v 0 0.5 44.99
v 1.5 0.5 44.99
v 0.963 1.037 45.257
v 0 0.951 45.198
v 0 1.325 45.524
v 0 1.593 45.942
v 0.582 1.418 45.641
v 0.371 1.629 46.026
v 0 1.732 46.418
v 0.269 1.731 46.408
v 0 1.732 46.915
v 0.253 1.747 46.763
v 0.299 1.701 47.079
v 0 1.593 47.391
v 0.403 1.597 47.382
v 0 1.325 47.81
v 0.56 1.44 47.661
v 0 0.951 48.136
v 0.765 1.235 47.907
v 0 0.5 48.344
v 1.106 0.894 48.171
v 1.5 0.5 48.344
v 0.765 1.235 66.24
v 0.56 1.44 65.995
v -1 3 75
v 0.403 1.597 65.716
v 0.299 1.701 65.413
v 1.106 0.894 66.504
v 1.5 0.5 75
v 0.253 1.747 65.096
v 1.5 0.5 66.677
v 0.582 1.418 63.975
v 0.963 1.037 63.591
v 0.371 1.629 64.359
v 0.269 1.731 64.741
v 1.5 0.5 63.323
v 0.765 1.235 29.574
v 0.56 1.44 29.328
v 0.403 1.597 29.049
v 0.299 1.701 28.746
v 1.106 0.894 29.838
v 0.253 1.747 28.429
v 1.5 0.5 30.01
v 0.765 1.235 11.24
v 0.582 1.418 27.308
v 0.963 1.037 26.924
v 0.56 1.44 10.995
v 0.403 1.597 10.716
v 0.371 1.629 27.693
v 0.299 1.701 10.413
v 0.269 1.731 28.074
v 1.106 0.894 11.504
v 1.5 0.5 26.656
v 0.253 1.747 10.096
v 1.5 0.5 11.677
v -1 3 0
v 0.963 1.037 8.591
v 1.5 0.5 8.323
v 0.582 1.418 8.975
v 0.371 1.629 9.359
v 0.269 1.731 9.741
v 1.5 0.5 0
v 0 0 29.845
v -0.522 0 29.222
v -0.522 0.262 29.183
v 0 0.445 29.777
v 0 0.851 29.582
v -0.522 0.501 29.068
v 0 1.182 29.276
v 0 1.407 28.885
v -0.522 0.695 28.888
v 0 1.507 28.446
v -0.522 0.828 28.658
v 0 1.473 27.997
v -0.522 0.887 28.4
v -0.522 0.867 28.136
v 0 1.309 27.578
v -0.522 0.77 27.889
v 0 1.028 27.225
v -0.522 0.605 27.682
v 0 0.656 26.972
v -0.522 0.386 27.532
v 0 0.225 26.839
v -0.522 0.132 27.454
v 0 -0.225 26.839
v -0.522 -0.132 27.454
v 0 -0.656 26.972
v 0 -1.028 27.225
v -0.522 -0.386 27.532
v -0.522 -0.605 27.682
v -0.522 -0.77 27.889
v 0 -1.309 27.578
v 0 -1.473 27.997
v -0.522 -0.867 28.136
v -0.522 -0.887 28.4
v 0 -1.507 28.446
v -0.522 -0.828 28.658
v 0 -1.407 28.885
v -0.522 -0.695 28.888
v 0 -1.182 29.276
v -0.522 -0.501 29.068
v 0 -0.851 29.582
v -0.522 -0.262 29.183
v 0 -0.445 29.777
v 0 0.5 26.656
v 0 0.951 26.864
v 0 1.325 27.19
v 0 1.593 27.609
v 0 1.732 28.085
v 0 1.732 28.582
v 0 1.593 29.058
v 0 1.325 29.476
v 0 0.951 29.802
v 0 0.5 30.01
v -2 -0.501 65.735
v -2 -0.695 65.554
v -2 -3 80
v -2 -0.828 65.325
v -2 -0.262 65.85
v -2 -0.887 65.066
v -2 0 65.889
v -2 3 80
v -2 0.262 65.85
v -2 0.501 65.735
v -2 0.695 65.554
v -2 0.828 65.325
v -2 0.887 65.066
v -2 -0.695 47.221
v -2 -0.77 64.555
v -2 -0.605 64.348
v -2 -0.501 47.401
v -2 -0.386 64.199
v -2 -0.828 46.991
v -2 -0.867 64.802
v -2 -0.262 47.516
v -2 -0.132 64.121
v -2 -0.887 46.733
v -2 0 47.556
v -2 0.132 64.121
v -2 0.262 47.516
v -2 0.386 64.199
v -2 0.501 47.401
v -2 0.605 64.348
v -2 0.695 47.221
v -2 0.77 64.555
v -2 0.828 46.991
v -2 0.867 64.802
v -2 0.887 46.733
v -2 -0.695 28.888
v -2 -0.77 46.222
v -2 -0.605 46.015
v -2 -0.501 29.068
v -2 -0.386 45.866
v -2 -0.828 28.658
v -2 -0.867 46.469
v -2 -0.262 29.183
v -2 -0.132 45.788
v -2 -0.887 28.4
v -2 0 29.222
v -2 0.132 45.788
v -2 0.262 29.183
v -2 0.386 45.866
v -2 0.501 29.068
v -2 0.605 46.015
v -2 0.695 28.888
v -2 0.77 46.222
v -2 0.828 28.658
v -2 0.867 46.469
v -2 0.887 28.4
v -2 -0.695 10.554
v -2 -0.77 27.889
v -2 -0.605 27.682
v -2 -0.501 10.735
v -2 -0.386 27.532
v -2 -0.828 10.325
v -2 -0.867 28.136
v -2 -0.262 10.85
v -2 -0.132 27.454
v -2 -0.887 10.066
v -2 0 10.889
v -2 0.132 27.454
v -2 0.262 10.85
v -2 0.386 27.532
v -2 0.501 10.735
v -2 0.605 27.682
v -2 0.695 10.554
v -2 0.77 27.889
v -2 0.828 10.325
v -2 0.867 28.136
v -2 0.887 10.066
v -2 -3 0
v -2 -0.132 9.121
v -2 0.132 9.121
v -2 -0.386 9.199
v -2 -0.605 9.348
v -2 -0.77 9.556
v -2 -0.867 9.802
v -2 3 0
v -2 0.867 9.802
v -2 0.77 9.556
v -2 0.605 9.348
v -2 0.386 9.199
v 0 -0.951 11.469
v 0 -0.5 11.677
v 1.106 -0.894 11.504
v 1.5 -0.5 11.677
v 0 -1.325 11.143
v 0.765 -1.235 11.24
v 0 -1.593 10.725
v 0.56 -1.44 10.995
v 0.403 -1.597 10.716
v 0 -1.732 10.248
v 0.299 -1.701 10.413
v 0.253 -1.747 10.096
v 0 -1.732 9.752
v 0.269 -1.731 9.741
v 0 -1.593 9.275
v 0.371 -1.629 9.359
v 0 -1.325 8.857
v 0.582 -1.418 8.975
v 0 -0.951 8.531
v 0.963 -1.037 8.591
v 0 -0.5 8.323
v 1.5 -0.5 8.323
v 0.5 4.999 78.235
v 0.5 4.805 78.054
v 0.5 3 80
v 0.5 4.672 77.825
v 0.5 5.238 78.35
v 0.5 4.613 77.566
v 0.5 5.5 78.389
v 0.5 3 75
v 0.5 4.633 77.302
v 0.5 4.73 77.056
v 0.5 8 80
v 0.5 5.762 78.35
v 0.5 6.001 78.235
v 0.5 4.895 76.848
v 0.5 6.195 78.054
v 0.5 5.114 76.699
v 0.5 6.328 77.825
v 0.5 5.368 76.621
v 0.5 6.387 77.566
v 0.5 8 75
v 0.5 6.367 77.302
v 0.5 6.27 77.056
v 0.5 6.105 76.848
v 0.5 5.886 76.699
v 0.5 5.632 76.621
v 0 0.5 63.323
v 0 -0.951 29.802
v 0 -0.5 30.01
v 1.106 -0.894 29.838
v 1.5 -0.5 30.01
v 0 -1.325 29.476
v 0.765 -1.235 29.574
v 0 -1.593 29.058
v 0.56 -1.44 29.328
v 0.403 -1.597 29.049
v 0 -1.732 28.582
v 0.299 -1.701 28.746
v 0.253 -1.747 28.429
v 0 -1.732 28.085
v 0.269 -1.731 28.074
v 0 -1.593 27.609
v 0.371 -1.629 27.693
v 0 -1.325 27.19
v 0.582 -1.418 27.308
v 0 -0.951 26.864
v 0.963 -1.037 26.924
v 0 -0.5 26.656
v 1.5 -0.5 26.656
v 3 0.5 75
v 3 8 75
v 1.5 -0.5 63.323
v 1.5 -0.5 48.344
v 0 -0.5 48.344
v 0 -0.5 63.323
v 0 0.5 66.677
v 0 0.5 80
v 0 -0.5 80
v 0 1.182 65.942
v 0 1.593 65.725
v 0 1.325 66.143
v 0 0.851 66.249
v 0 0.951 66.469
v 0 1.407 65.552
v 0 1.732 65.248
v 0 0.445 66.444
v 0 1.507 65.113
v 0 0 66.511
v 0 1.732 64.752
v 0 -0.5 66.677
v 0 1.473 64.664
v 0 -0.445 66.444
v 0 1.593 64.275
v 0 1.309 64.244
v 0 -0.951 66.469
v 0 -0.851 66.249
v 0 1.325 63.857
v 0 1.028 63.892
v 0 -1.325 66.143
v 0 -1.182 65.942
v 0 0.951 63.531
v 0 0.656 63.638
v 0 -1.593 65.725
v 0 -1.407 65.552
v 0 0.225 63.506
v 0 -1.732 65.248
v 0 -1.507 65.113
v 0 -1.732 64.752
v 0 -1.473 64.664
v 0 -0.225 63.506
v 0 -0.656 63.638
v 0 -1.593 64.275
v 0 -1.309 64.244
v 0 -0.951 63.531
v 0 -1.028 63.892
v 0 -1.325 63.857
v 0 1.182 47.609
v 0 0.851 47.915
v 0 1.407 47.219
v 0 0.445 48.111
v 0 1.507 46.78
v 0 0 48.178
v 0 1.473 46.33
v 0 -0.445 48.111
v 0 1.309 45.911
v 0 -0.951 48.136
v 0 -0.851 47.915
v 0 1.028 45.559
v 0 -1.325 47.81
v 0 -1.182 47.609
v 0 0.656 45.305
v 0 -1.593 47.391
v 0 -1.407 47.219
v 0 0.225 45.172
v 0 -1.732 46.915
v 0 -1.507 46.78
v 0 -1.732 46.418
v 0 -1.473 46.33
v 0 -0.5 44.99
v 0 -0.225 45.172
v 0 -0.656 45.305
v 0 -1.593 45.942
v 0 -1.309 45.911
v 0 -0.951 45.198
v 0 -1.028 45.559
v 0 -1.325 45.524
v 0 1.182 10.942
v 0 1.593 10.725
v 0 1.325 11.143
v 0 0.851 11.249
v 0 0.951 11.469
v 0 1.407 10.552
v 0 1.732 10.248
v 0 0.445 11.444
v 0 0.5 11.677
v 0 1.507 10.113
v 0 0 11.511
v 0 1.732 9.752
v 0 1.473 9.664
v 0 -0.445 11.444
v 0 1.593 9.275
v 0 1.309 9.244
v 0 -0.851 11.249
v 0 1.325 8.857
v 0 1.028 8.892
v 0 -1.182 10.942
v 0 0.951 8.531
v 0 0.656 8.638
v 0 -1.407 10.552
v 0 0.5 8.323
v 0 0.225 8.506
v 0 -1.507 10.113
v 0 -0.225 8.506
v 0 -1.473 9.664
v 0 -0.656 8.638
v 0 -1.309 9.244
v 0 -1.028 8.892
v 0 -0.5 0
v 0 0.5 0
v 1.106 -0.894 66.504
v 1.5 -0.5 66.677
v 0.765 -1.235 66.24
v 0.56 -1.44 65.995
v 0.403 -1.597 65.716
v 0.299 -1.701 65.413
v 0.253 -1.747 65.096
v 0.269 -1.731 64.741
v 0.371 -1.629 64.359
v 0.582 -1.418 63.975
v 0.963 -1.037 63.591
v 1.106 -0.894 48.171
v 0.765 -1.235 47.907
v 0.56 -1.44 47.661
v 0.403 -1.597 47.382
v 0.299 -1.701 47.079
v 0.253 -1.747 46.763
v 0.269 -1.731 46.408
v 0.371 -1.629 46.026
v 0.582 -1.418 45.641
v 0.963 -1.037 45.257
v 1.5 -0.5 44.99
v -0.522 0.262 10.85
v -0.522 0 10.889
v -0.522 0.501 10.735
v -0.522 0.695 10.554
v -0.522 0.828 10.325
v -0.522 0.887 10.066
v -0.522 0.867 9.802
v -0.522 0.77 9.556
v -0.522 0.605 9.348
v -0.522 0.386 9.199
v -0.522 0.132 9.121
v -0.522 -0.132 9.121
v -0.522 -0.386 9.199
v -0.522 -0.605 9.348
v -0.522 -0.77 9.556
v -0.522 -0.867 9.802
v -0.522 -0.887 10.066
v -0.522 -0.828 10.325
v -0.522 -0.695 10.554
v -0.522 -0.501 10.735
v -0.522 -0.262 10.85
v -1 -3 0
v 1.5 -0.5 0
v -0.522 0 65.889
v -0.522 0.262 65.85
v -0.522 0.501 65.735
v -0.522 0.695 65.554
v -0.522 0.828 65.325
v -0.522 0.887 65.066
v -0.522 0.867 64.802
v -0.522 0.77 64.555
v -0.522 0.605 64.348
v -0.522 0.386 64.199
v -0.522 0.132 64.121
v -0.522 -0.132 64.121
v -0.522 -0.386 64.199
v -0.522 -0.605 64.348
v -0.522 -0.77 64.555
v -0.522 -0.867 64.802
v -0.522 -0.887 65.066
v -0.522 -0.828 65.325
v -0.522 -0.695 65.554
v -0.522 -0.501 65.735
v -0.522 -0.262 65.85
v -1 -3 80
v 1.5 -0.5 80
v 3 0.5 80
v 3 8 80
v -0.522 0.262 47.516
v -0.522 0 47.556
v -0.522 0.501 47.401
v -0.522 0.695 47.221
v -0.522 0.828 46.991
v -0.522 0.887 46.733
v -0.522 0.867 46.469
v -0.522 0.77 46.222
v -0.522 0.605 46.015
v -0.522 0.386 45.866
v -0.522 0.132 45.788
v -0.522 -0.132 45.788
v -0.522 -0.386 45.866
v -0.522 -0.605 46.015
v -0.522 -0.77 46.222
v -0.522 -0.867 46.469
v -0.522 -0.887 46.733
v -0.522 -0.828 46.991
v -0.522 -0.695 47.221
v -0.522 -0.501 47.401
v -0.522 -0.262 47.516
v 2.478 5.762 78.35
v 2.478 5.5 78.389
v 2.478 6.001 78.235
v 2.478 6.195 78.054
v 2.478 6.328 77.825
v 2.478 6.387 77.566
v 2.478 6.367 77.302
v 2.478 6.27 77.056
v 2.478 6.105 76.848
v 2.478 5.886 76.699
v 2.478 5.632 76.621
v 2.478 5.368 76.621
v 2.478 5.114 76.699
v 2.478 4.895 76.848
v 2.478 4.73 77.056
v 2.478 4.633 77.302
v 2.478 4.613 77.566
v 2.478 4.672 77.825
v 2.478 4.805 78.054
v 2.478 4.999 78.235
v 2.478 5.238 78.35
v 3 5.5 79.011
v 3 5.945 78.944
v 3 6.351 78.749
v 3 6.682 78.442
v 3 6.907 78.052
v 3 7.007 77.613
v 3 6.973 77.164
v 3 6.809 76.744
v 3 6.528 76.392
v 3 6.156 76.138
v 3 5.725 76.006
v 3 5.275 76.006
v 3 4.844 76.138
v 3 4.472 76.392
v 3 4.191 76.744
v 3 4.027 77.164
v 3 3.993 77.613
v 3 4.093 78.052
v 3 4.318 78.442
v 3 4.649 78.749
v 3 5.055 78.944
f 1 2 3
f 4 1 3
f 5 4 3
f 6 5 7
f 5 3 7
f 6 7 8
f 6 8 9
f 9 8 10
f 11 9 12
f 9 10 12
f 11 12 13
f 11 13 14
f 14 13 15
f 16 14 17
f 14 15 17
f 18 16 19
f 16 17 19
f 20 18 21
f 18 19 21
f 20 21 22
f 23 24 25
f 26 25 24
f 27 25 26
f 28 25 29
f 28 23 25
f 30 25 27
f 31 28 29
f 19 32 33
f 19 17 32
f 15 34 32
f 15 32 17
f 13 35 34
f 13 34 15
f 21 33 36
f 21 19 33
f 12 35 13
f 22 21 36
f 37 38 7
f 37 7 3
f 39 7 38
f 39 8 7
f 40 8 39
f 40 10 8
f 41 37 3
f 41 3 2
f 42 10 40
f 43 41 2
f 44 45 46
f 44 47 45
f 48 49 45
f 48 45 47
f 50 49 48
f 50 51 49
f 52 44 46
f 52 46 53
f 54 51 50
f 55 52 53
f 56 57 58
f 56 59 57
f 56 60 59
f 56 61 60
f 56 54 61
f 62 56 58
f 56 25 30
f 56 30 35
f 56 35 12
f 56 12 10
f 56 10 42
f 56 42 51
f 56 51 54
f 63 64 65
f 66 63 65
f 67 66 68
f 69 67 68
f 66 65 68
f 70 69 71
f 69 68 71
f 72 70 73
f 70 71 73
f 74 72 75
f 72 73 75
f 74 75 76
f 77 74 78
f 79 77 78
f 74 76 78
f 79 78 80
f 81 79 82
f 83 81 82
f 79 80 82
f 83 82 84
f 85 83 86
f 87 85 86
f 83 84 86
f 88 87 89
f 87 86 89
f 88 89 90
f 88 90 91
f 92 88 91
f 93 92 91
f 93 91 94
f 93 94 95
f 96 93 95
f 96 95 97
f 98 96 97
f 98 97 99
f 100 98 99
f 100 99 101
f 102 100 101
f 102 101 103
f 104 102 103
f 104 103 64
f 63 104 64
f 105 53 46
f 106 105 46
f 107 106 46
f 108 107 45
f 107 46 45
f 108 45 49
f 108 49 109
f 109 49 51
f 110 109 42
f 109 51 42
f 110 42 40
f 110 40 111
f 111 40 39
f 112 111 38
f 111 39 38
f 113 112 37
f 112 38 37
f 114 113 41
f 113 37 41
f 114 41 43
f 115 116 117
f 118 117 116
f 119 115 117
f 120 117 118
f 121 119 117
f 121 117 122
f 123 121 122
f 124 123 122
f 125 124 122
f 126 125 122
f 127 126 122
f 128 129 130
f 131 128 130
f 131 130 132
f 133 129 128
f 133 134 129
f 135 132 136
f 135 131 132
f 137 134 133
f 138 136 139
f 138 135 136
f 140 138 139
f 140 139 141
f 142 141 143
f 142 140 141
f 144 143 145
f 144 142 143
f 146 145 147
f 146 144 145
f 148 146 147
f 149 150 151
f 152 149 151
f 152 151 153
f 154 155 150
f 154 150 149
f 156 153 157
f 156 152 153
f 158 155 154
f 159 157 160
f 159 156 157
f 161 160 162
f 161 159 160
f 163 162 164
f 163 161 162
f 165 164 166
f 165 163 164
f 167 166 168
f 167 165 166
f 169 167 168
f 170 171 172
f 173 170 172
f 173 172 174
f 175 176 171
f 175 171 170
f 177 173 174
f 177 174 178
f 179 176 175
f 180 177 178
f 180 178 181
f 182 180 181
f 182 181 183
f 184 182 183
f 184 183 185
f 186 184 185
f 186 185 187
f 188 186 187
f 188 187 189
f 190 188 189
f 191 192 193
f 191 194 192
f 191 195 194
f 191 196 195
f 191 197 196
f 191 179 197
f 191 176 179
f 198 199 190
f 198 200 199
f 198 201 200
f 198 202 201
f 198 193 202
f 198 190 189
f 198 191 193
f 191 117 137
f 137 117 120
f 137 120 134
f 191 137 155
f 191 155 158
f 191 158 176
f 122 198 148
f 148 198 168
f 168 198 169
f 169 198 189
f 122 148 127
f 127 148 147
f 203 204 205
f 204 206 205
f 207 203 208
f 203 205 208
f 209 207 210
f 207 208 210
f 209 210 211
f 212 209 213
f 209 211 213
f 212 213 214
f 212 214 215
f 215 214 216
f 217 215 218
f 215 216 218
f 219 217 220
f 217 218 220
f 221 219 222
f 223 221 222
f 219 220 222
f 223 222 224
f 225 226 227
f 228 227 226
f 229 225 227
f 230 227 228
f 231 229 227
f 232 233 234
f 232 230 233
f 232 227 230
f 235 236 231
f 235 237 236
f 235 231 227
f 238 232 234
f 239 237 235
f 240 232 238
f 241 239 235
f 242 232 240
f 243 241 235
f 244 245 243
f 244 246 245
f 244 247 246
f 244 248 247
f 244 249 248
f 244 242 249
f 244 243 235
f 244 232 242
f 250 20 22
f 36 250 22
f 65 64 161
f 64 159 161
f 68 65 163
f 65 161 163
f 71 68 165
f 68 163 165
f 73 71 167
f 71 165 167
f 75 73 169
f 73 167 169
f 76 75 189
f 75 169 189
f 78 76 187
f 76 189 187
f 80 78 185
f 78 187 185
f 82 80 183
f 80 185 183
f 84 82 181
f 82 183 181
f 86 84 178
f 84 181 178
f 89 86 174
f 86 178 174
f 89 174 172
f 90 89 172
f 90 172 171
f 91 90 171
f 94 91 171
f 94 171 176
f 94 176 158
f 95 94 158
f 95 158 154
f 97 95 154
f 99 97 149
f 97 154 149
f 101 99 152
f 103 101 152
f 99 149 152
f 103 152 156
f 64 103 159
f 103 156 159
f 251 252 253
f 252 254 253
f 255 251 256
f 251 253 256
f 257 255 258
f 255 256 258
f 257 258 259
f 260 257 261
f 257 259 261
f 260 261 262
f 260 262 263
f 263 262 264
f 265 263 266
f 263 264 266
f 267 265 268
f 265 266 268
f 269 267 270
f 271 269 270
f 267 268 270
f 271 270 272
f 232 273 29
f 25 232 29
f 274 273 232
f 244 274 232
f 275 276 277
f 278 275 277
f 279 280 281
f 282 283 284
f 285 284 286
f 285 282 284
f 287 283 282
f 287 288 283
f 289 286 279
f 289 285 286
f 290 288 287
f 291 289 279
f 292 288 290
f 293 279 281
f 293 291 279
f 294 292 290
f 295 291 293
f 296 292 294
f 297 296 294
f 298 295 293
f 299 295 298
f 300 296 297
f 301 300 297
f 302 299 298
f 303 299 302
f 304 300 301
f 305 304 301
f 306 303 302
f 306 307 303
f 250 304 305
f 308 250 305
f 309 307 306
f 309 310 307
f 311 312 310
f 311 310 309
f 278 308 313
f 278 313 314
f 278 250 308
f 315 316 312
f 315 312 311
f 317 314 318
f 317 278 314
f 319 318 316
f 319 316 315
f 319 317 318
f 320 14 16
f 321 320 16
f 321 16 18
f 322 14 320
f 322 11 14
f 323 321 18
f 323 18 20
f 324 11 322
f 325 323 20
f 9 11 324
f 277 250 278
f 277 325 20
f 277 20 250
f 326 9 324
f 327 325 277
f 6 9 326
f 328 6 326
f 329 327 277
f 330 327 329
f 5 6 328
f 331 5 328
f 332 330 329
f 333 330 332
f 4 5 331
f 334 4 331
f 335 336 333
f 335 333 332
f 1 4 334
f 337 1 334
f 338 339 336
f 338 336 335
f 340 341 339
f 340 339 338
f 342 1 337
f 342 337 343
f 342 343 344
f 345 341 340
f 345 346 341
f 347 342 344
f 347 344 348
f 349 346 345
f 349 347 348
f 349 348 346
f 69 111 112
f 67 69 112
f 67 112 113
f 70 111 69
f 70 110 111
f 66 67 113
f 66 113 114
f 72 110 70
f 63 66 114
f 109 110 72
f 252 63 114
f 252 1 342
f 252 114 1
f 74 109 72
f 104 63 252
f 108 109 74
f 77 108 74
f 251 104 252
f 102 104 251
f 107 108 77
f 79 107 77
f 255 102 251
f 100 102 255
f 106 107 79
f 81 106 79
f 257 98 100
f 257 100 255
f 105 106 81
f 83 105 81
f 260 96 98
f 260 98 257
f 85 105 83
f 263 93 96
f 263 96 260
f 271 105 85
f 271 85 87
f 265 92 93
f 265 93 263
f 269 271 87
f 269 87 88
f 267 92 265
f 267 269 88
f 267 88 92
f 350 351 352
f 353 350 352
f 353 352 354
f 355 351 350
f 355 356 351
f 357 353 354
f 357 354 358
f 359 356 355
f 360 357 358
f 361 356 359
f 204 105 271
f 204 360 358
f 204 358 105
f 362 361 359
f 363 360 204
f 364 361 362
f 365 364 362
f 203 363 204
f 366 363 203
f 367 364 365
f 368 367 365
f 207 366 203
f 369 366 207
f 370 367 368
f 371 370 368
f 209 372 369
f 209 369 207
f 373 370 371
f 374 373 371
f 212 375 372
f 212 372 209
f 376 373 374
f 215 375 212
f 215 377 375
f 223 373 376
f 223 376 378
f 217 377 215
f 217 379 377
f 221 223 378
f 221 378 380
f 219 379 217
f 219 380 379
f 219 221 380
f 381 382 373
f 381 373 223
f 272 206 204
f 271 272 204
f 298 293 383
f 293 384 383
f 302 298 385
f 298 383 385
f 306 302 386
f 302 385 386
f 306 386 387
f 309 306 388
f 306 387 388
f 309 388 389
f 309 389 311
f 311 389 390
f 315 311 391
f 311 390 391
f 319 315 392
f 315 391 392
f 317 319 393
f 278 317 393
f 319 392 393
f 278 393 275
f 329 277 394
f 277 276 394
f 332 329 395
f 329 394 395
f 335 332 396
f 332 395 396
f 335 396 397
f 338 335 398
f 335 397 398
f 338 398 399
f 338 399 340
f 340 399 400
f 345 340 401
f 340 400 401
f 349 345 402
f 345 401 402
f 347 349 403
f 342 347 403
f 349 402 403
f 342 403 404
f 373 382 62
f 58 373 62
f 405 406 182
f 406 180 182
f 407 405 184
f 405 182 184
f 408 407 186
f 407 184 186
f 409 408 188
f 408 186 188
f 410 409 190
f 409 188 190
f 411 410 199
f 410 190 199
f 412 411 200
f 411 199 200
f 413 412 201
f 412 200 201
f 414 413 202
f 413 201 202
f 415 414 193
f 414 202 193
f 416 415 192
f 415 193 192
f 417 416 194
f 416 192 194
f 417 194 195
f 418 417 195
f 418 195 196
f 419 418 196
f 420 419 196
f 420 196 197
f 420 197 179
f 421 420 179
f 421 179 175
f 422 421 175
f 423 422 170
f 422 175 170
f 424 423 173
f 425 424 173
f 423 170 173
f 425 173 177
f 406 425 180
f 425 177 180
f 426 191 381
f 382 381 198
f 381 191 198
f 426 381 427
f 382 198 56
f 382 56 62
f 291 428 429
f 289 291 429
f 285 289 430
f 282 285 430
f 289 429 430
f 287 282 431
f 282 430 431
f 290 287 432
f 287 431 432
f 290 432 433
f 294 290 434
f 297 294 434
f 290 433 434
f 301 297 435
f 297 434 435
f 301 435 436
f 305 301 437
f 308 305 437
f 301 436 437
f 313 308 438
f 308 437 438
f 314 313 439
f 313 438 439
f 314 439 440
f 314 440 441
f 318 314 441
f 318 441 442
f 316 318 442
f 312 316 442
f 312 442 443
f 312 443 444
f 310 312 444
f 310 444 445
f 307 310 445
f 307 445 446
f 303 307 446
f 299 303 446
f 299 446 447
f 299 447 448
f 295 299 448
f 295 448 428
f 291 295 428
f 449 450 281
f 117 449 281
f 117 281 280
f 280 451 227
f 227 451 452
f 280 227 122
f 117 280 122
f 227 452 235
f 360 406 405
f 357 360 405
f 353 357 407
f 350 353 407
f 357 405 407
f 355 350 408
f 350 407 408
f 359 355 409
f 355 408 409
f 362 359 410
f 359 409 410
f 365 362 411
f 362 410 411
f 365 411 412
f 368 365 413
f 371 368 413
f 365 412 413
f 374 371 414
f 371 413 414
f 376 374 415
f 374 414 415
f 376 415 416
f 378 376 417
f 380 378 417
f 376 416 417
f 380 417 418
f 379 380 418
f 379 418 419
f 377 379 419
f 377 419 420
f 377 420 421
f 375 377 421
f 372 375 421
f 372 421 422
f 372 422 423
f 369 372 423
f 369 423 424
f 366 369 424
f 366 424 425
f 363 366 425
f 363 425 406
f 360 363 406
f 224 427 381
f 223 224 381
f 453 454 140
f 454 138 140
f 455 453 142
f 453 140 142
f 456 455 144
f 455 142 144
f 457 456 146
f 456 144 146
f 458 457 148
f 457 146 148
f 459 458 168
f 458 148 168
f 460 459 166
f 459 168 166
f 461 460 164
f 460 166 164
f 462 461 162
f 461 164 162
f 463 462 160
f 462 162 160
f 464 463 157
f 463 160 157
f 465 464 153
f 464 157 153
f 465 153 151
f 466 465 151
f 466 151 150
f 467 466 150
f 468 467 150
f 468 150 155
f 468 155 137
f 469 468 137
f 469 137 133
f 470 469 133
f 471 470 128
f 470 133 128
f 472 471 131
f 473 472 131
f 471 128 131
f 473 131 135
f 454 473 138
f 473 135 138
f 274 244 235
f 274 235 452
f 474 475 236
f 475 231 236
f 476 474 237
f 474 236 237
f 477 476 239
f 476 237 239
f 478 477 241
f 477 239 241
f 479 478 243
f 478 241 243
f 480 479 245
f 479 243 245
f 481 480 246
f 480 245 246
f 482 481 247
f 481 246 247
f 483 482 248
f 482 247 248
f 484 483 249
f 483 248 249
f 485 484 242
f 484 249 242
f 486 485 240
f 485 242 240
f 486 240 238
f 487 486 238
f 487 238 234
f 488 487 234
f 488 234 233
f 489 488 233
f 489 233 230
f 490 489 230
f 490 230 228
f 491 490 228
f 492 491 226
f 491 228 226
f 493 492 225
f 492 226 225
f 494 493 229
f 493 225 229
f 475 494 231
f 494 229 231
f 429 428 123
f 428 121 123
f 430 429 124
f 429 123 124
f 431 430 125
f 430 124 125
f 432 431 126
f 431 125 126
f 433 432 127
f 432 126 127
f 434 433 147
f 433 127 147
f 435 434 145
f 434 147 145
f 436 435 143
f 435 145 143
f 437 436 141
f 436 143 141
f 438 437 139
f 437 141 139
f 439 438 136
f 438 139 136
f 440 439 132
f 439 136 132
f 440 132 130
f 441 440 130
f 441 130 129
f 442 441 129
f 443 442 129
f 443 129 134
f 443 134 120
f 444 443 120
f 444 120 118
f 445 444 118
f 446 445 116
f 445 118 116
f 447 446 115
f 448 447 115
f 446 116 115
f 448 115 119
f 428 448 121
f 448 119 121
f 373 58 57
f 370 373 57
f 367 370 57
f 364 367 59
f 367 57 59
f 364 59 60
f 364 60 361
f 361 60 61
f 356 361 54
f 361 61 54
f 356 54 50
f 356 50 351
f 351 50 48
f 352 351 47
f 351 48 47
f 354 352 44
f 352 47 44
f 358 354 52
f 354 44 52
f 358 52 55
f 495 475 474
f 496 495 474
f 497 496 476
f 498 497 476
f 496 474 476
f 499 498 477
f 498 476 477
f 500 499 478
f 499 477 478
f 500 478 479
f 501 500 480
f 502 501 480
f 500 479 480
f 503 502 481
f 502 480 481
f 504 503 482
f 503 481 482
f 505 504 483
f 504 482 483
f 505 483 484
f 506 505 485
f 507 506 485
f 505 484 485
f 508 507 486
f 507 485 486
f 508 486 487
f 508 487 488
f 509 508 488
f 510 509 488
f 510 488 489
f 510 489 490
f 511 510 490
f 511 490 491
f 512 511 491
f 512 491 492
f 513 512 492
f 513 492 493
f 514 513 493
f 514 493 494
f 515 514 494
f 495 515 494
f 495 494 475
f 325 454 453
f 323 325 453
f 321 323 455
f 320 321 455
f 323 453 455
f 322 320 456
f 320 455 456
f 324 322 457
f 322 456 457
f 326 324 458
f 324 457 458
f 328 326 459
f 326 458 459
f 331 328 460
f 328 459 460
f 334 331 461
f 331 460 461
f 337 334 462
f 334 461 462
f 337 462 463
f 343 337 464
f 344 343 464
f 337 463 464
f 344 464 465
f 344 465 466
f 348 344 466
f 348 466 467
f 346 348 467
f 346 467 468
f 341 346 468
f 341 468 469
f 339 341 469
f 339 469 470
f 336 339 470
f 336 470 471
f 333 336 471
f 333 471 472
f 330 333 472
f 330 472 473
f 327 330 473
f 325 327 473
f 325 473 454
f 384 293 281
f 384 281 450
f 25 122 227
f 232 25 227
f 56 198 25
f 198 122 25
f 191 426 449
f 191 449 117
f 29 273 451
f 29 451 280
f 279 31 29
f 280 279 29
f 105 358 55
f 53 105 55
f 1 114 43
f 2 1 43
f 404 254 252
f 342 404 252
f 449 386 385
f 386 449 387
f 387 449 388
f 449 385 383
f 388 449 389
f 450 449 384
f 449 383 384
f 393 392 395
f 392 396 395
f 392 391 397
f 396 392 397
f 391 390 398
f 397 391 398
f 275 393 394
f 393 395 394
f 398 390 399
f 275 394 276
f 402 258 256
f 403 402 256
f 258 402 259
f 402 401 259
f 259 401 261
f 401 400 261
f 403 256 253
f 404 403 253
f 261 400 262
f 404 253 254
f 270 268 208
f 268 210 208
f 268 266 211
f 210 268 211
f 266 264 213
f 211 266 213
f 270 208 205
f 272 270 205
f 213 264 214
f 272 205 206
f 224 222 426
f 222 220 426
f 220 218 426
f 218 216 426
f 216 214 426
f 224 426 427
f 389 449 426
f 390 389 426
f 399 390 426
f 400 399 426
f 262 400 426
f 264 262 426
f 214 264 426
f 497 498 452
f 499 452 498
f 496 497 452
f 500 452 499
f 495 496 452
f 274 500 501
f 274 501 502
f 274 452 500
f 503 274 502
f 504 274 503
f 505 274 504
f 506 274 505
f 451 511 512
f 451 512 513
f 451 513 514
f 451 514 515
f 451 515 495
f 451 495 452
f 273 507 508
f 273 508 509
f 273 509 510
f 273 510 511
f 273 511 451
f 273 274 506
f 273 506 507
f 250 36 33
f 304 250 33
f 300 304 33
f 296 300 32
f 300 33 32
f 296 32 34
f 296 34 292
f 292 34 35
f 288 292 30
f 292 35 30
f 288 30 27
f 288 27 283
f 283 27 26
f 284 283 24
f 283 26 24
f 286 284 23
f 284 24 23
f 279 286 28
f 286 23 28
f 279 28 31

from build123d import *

# Parameters (mm, degrees)
BOSS_EXTRUDE1_DEPTH                               = 75
SKETCH5_R                                         = 1.75
CUT_EXTRUDE1_DEPTH                                = 2
CSK_FOR_0_FLAT_HEAD_MACHINE_SCREW_100_D           = 1.778
CSK_FOR_0_FLAT_HEAD_MACHINE_SCREW_100_DEPTH       = 3.302
CSK_FOR_0_FLAT_HEAD_MACHINE_SCREW_100_CSINK_D     = 3.0226
CSK_FOR_0_FLAT_HEAD_MACHINE_SCREW_100_CSINK_ANGLE = 100
CSK_FOR_0_FLAT_HEAD_MACHINE_SCREW_100_TIP         = 0.53416509
CHAMFER1_SIZE                                     = 3
BOSS_EXTRUDE2_DEPTH                               = 5
CHAMFER2_SIZE                                     = 3
CSK_FOR_0_FLAT_HEAD_MACHINE_SCREW_2_D             = 1.778
CSK_FOR_0_FLAT_HEAD_MACHINE_SCREW_2_DEPTH         = 3.302
CSK_FOR_0_FLAT_HEAD_MACHINE_SCREW_2_CSINK_D       = 3.0226
CSK_FOR_0_FLAT_HEAD_MACHINE_SCREW_2_CSINK_ANGLE   = 100
CSK_FOR_0_FLAT_HEAD_MACHINE_SCREW_2_TIP           = 0.53416509


with BuildPart() as part:
    # Sketch1 → Boss-Extrude1 (new body)
    with BuildSketch(Plane.XY):
        Polygon((-2, -3), (2, -3), (2, -0.5), (0, -0.5), (0, 0.5), (2, 0.5), (2, 3), (-2, 3), align=None)
    extrude(amount=BOSS_EXTRUDE1_DEPTH)

    # Sketch5 → Cut-Extrude1 (cut)
    with BuildSketch(Plane(origin=(2, 0, 0), x_dir=(0, 0, -1), z_dir=(1, 0, 0))):
        with Locations((-65, 0)):
            Circle(SKETCH5_R)
        with Locations((-46.66667, 0)):
            Circle(SKETCH5_R)
        with Locations((-28.33334, 0)):
            Circle(SKETCH5_R)
        with Locations((-10.00001, 0)):
            Circle(SKETCH5_R)
    extrude(amount=-CUT_EXTRUDE1_DEPTH, mode=Mode.SUBTRACT)

    # CSK for _0 Flat Head Machine Screw _100
    with Locations(Plane(origin=(0, 0, 0), x_dir=(0, 0, -1), z_dir=(1, 0, 0))):
        with Locations((-65, 0), (-10.00001, 0), (-46.66667, 0), (-28.33334, 0)):
            CounterSinkHole(CSK_FOR_0_FLAT_HEAD_MACHINE_SCREW_100_D / 2, CSK_FOR_0_FLAT_HEAD_MACHINE_SCREW_100_CSINK_D / 2, depth=CSK_FOR_0_FLAT_HEAD_MACHINE_SCREW_100_DEPTH, counter_sink_angle=CSK_FOR_0_FLAT_HEAD_MACHINE_SCREW_100_CSINK_ANGLE)
            with Locations((0, 0, -(CSK_FOR_0_FLAT_HEAD_MACHINE_SCREW_100_DEPTH + CSK_FOR_0_FLAT_HEAD_MACHINE_SCREW_100_TIP / 2))):  # 118° drill point
                Cone(0, CSK_FOR_0_FLAT_HEAD_MACHINE_SCREW_100_D / 2, CSK_FOR_0_FLAT_HEAD_MACHINE_SCREW_100_TIP, mode=Mode.SUBTRACT)

    # Chamfer1
    # the kernel refuses this chamfer: 3 mm, written as the material it takes off along each edge
    with BuildSketch(Plane(origin=(2, -3, -7.715048964), x_dir=(-0.9996219169112968, -0.027495876610586348, 0), z_dir=(0, 0, 1))) as chamfer1_piece_1:
        Polygon((CHAMFER1_SIZE * 0.999621916911, -CHAMFER1_SIZE * 0.0274958766106), (-CHAMFER1_SIZE * 0.0274958766106, -CHAMFER1_SIZE * 0.999621916911), (0, 0), align=None)
    extrude(amount=90.430097928, mode=Mode.SUBTRACT)
    with BuildSketch(Plane(origin=(2, 3, -7.715048964), x_dir=(-0.9996219169112968, 0.027495876610586348, 0), z_dir=(0, 0, 1))) as chamfer1_piece_2:
        Polygon((CHAMFER1_SIZE * 0.999621916911, CHAMFER1_SIZE * 0.0274958766106), (-CHAMFER1_SIZE * 0.0274958766106, CHAMFER1_SIZE * 0.999621916911), (0, 0), align=None)
    extrude(amount=90.430097928, mode=Mode.SUBTRACT)

    # Sketch6 → Boss-Extrude2 (add)
    with BuildSketch(Plane.XY.offset(75)):
        Polygon((0.5, 8), (3, 8), (3, 0.5), (0, 0.5), (0, -0.5), (2, -0.5), (2, -3), (-2, -3), (-2, 3), (0.5, 3), align=None)
    extrude(amount=BOSS_EXTRUDE2_DEPTH)

    # Chamfer2
    # the kernel refuses this chamfer: 3 mm, written as the material it takes off along each edge
    with BuildSketch(Plane(origin=(2, -3, 67.284951036), x_dir=(-0.9996219169112968, -0.027495876610586348, 0), z_dir=(0, 0, 1))) as chamfer2_piece_1:
        Polygon((CHAMFER2_SIZE * 0.999621916911, -CHAMFER2_SIZE * 0.0274958766106), (-CHAMFER2_SIZE * 0.0274958766106, -CHAMFER2_SIZE * 0.999621916911), (0, 0), align=None)
    extrude(amount=20.430097928, mode=Mode.SUBTRACT)

    # CSK for _0 Flat Head Machine Screw _ 2
    with Locations(Plane(origin=(3, 0, 0), x_dir=(0, 0, -1), z_dir=(1, 0, 0))):
        with Locations((-77.5, 5.5)):
            CounterSinkHole(CSK_FOR_0_FLAT_HEAD_MACHINE_SCREW_2_D / 2, CSK_FOR_0_FLAT_HEAD_MACHINE_SCREW_2_CSINK_D / 2, depth=CSK_FOR_0_FLAT_HEAD_MACHINE_SCREW_2_DEPTH, counter_sink_angle=CSK_FOR_0_FLAT_HEAD_MACHINE_SCREW_2_CSINK_ANGLE)
            with Locations((0, 0, -(CSK_FOR_0_FLAT_HEAD_MACHINE_SCREW_2_DEPTH + CSK_FOR_0_FLAT_HEAD_MACHINE_SCREW_2_TIP / 2))):  # 118° drill point
                Cone(0, CSK_FOR_0_FLAT_HEAD_MACHINE_SCREW_2_D / 2, CSK_FOR_0_FLAT_HEAD_MACHINE_SCREW_2_TIP, mode=Mode.SUBTRACT)


solid = part.part
